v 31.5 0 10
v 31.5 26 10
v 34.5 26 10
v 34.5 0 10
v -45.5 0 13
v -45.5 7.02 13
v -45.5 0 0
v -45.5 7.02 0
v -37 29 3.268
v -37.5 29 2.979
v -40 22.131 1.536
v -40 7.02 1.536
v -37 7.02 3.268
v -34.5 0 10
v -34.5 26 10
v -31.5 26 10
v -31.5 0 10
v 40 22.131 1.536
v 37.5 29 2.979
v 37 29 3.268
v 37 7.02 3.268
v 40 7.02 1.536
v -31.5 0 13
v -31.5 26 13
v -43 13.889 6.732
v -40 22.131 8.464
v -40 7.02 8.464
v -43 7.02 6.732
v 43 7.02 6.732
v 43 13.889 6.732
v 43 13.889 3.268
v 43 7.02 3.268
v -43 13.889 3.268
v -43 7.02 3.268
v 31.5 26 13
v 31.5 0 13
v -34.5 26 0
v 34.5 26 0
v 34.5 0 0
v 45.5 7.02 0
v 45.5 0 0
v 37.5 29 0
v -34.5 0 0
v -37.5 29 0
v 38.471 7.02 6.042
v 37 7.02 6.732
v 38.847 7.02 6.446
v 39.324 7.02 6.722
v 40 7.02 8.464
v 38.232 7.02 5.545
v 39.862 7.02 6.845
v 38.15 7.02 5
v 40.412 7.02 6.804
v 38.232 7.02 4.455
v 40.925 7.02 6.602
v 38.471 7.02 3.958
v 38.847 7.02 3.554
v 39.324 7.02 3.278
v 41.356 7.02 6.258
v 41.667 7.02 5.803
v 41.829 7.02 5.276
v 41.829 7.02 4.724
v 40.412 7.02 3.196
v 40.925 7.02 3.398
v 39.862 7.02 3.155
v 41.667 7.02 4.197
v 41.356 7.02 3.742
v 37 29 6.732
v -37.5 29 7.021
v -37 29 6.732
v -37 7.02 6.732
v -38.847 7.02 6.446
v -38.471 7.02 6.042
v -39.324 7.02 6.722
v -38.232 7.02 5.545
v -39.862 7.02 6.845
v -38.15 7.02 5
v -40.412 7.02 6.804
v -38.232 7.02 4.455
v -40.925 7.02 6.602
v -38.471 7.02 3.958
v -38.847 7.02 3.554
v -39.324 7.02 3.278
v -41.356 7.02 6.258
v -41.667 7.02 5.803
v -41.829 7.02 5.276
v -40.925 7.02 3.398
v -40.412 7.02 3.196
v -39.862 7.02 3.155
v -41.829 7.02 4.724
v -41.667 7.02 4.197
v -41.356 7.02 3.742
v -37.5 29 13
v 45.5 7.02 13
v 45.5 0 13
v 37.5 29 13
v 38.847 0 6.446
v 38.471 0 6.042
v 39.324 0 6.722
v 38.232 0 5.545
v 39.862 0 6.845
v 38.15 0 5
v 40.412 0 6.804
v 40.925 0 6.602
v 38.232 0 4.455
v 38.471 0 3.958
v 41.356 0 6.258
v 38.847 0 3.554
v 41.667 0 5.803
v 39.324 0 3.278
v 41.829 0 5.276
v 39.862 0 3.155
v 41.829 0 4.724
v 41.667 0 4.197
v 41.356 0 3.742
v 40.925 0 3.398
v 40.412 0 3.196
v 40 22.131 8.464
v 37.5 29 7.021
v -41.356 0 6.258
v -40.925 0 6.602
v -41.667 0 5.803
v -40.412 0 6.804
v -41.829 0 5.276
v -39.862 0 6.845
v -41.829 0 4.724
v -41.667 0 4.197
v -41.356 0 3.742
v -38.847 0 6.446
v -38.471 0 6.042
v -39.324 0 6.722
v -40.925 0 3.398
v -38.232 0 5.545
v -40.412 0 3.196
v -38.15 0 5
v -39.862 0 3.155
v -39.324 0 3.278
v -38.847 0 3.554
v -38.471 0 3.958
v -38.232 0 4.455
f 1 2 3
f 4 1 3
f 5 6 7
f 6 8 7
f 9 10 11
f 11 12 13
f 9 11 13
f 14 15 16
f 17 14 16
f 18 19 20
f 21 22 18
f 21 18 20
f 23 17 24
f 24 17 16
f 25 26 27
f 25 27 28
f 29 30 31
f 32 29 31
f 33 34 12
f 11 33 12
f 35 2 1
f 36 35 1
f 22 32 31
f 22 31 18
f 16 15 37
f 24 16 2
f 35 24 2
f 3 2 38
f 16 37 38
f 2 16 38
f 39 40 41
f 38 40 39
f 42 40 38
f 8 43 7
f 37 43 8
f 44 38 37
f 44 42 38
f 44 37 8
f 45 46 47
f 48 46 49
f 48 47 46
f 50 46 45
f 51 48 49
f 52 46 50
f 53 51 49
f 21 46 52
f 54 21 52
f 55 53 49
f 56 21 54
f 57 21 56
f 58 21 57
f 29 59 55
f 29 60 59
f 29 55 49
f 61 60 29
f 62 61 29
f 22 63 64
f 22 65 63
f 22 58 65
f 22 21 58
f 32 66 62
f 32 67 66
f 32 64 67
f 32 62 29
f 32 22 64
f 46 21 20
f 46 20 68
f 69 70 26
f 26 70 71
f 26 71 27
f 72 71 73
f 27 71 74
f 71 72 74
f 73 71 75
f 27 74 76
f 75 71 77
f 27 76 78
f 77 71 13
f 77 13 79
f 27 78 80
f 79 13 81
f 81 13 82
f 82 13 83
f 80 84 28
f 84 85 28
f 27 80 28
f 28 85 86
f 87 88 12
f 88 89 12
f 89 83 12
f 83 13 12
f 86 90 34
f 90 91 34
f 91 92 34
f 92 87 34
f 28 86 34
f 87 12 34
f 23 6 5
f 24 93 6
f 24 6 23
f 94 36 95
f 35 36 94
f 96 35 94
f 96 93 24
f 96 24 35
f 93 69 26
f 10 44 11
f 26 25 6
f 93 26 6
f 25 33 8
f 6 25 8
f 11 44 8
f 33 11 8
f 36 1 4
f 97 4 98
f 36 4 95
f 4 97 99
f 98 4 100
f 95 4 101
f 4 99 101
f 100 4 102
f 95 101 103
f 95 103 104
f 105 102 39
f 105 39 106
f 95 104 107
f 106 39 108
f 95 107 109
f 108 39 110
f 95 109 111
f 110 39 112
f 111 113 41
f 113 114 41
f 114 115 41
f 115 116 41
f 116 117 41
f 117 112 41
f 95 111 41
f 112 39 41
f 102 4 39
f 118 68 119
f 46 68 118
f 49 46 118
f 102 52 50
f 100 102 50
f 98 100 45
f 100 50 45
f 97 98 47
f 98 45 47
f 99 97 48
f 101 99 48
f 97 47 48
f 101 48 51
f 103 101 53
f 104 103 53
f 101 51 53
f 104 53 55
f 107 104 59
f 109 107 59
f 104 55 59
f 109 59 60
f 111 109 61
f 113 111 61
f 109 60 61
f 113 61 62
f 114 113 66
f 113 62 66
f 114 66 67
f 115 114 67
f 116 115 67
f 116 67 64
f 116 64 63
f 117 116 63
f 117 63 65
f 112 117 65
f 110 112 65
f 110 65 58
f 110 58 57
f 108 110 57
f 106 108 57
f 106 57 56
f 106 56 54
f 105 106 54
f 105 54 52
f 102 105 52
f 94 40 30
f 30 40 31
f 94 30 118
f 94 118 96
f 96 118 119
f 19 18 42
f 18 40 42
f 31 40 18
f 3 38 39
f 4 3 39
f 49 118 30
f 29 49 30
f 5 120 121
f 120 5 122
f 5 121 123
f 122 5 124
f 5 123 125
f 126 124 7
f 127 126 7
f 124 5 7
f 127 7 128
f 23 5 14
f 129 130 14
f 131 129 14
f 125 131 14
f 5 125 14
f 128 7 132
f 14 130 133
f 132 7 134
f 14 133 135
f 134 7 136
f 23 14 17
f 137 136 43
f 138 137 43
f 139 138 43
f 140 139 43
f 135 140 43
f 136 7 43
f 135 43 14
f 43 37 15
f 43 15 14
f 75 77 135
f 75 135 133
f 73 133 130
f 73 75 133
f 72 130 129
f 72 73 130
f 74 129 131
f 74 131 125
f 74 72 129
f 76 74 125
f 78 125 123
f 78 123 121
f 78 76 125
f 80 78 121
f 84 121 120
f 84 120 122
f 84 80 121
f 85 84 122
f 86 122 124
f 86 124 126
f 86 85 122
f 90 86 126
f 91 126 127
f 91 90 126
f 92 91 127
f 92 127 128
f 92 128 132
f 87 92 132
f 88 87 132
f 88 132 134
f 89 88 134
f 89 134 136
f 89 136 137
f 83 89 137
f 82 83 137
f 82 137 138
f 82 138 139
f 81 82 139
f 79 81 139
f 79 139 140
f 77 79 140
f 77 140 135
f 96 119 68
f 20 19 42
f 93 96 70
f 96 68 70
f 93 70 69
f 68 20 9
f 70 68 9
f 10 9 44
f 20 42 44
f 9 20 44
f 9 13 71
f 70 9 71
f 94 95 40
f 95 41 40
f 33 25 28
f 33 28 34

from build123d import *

# Parameters (mm, degrees)
BOSS_EXTRUDE1_DEPTH = 10
CUT_EXTRUDE1_DEPTH  = 40
SKETCH2_3_R         = 1.85
CUT_EXTRUDE2_DEPTH  = 40
BOSS_EXTRUDE2_DEPTH = 3


with BuildPart() as part:
    # Sketch1 → Boss-Extrude1 (new body)
    with BuildSketch(Plane.XY):
        Polygon((0, 26), (34.5, 26), (34.5, 0), (45.5, 0), (45.5, 7.020180644), (37.5, 29), (0, 29), align=None)
    extrude(amount=BOSS_EXTRUDE1_DEPTH)

    # Sketch2 → Cut-Extrude1 (cut)
    with BuildSketch(Plane(origin=(0, 7.020180644, 0), x_dir=(1, 0, 0), z_dir=(0, 1, 0))):
        Polygon((37, -6.732050808), (40, -8.464101615), (43, -6.732050808), (43, -3.267949192), (40, -1.535898385), (37, -3.267949192), align=None)
    extrude(amount=CUT_EXTRUDE1_DEPTH, mode=Mode.SUBTRACT)

    # Sketch2<3> → Cut-Extrude2 (cut)
    with BuildSketch(Plane(origin=(0, 7.020180644, 0), x_dir=(1, 0, 0), z_dir=(0, 1, 0))):
        with Locations((40, -5)):
            Circle(SKETCH2_3_R)
    extrude(amount=-CUT_EXTRUDE2_DEPTH, mode=Mode.SUBTRACT)

    # Mirror1: part across plane


with BuildPart() as part_1:
    add(part.part)
    add(part.part.mirror(Plane(origin=(0, 29, 10), x_dir=(0, 0, 1), z_dir=(1, 0, 0))))

    # Sketch3 → Boss-Extrude2 (add)
    with BuildSketch(Plane.XY.offset(10)):
        Polygon((31.5, 0), (45.5, 0), (45.5, 7.020180644), (37.5, 29), (-37.5, 29), (-45.5, 7.020180644), (-45.5, 0), (-31.5, 0), (-31.5, 26), (31.5, 26), align=None)
    extrude(amount=BOSS_EXTRUDE2_DEPTH)


solid = part_1.part
